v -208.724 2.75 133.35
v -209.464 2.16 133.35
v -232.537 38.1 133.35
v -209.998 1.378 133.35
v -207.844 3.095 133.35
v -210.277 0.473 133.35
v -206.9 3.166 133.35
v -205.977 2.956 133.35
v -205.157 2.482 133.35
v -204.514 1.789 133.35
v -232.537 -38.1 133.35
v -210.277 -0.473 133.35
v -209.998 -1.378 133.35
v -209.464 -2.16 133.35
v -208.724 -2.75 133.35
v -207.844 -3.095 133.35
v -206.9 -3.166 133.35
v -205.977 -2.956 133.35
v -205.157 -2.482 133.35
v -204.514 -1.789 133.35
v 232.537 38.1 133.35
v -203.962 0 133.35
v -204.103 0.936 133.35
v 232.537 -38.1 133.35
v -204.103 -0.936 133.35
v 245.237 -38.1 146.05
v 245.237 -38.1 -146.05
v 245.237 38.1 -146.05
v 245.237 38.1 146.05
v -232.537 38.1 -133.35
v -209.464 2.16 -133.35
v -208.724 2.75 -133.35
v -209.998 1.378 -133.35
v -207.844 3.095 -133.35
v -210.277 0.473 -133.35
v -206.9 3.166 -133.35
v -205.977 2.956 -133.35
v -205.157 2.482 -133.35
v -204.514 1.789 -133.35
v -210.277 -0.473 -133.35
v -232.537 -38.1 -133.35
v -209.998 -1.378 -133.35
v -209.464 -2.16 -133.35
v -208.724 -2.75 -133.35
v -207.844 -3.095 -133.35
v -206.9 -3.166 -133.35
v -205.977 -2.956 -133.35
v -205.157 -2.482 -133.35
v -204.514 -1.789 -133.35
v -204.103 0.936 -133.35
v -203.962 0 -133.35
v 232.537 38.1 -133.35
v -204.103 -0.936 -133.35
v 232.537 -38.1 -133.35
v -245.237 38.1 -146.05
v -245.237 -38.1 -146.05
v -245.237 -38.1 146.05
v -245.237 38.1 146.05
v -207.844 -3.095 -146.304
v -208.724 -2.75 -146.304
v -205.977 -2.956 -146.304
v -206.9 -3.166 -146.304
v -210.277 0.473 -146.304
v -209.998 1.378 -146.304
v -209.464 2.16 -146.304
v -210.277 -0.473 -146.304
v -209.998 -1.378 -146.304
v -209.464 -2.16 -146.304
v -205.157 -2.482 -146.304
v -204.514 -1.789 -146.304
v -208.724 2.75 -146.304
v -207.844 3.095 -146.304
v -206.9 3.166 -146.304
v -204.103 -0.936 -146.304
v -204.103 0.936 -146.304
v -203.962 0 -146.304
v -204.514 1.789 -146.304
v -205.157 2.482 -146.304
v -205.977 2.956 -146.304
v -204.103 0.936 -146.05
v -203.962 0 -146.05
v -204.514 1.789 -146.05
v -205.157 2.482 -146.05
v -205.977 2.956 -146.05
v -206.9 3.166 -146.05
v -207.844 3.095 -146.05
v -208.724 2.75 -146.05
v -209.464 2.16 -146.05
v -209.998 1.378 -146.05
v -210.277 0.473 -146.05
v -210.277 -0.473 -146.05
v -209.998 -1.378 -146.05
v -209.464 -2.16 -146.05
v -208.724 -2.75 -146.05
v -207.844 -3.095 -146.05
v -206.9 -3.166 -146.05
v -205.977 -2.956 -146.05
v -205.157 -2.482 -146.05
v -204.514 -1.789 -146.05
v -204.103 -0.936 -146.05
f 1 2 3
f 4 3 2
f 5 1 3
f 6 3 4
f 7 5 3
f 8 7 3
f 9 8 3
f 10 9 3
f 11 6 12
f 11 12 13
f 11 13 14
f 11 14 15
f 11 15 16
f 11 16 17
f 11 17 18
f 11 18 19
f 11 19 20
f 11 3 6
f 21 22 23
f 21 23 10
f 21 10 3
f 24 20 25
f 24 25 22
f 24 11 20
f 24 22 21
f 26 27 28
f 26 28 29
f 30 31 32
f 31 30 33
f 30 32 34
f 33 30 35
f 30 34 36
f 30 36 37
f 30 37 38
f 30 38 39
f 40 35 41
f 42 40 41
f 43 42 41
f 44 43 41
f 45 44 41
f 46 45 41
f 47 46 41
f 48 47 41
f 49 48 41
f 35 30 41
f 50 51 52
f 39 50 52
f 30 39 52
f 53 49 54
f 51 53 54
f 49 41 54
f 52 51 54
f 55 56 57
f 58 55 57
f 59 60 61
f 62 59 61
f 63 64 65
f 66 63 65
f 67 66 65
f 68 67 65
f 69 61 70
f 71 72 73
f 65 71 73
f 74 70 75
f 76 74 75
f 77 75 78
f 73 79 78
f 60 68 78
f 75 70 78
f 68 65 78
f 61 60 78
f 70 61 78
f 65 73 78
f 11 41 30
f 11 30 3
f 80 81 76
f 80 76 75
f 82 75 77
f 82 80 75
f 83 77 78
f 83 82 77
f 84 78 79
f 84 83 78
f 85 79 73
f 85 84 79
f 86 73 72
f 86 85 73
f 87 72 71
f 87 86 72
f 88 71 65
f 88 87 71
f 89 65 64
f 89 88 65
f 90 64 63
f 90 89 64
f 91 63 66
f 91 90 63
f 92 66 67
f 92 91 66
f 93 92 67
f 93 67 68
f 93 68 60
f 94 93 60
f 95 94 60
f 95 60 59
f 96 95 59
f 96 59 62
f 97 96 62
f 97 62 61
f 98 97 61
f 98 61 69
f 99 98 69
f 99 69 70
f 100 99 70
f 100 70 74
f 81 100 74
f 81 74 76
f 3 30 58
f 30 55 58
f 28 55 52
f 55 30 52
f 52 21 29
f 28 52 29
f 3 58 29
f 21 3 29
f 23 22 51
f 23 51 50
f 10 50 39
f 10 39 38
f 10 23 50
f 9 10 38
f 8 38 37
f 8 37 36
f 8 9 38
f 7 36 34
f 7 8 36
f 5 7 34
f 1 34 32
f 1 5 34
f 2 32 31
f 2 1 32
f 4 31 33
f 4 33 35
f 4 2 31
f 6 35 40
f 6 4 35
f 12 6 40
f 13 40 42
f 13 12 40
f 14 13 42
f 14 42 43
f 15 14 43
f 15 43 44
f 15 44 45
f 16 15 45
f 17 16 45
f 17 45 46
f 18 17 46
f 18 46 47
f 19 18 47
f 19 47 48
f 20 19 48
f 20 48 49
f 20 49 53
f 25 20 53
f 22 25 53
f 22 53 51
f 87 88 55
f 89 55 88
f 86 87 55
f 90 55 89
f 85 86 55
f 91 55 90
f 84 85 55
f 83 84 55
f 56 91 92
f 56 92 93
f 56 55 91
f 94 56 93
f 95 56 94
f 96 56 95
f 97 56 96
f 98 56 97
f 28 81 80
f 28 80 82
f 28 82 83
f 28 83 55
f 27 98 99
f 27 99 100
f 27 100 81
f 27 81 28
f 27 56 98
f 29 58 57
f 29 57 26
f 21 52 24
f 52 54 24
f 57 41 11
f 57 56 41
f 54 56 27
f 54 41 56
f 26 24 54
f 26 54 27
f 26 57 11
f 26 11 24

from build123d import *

# Parameters (mm, degrees)
F0_W     = 490.474
F0_H     = 292.1
F0_W_2   = 465.074
F0_H_2   = 266.7
F1_DEPTH = 38.1
F2_R     = 3.175
F3_DEPTH = 292.354


with BuildPart() as f1:
    # F0 (on Front) → F1 (new body, symmetric)
    with BuildSketch(Plane.XZ):
        Rectangle(F0_W, F0_H)
        Rectangle(F0_W_2, F0_H_2, mode=Mode.SUBTRACT)
    extrude(amount=F1_DEPTH, both=True)

    # F2 (on face) → F3 (join)
    with BuildSketch(Plane.XY.offset(146.05)):
        with Locations((-207.137, 0)):
            Circle(F2_R)
    extrude(amount=-F3_DEPTH)


solid = f1.part
